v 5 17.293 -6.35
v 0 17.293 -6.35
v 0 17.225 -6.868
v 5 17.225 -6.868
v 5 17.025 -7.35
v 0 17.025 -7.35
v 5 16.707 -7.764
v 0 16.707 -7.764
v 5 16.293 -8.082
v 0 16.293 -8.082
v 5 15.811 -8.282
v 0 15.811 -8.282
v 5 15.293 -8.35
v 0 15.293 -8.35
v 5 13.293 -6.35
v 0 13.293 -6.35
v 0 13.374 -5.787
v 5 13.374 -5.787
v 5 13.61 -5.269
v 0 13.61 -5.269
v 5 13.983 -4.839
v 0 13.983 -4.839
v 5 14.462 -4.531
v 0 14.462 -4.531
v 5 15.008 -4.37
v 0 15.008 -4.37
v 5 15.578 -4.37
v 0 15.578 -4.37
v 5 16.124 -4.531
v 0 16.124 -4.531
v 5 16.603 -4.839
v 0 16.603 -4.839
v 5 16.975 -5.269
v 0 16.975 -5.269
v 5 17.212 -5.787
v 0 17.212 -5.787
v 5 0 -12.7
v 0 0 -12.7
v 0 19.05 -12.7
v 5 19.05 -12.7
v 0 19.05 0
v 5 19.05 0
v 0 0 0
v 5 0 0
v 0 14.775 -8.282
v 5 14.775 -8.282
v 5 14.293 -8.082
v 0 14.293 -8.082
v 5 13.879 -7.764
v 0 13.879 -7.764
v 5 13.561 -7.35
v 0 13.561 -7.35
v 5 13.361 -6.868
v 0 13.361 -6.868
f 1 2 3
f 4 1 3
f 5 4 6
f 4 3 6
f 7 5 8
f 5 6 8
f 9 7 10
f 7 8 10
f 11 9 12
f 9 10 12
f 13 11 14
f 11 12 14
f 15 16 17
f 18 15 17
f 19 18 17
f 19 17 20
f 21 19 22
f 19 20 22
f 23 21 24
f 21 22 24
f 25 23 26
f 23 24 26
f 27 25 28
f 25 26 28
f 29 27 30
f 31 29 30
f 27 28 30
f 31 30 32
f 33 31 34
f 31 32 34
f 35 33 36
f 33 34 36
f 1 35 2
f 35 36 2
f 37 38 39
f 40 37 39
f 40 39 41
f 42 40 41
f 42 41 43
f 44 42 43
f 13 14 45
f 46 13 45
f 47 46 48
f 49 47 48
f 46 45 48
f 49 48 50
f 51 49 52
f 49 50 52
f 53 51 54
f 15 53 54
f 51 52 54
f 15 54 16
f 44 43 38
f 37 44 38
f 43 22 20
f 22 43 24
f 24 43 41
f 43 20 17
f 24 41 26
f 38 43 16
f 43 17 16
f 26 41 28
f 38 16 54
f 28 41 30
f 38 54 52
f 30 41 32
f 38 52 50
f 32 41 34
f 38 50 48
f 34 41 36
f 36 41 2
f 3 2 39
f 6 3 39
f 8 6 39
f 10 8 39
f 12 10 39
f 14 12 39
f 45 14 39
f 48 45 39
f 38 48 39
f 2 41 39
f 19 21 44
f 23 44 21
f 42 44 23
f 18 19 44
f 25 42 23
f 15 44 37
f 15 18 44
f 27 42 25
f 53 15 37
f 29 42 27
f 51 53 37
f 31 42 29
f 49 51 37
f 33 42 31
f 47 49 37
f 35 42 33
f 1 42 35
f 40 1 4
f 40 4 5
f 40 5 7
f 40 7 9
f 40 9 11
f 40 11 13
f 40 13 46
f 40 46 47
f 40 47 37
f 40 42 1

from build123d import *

# Parameters (mm, degrees)
BOSS_EXTRUDE1_DEPTH = 5


with BuildPart() as part:
    # Sketch1 → Boss-Extrude1 (new body)
    with BuildSketch(Plane(origin=(0, 0, 0), x_dir=(0, 0, -1), z_dir=(1, 0, 0))):
        with BuildLine():
            Line((6.35, 17.292870535), (6.35, 19.05))
            Line((6.35, 19.05), (0, 19.05))
            Line((0, 19.05), (0, 0))
            Line((0, 0), (6.35, 0))
            Line((6.35, 0), (6.35, 13.292870535))
            ThreePointArc((6.35, 13.292870535), (4.35, 15.292870535), (6.35, 17.292870535))
        make_face()
        with BuildLine():
            Line((12.7, 19.05), (6.35, 19.05))
            Line((6.35, 19.05), (6.35, 17.292870535))
            ThreePointArc((6.35, 17.292870535), (7.764213562, 16.707084098), (8.35, 15.292870535))
            ThreePointArc((8.35, 15.292870535), (7.764213562, 13.878656973), (6.35, 13.292870535))
            Line((6.35, 13.292870535), (6.35, 0))
            Line((6.35, 0), (12.7, 0))
            Line((12.7, 0), (12.7, 19.05))
        make_face()
    extrude(amount=BOSS_EXTRUDE1_DEPTH)


solid = part.part
